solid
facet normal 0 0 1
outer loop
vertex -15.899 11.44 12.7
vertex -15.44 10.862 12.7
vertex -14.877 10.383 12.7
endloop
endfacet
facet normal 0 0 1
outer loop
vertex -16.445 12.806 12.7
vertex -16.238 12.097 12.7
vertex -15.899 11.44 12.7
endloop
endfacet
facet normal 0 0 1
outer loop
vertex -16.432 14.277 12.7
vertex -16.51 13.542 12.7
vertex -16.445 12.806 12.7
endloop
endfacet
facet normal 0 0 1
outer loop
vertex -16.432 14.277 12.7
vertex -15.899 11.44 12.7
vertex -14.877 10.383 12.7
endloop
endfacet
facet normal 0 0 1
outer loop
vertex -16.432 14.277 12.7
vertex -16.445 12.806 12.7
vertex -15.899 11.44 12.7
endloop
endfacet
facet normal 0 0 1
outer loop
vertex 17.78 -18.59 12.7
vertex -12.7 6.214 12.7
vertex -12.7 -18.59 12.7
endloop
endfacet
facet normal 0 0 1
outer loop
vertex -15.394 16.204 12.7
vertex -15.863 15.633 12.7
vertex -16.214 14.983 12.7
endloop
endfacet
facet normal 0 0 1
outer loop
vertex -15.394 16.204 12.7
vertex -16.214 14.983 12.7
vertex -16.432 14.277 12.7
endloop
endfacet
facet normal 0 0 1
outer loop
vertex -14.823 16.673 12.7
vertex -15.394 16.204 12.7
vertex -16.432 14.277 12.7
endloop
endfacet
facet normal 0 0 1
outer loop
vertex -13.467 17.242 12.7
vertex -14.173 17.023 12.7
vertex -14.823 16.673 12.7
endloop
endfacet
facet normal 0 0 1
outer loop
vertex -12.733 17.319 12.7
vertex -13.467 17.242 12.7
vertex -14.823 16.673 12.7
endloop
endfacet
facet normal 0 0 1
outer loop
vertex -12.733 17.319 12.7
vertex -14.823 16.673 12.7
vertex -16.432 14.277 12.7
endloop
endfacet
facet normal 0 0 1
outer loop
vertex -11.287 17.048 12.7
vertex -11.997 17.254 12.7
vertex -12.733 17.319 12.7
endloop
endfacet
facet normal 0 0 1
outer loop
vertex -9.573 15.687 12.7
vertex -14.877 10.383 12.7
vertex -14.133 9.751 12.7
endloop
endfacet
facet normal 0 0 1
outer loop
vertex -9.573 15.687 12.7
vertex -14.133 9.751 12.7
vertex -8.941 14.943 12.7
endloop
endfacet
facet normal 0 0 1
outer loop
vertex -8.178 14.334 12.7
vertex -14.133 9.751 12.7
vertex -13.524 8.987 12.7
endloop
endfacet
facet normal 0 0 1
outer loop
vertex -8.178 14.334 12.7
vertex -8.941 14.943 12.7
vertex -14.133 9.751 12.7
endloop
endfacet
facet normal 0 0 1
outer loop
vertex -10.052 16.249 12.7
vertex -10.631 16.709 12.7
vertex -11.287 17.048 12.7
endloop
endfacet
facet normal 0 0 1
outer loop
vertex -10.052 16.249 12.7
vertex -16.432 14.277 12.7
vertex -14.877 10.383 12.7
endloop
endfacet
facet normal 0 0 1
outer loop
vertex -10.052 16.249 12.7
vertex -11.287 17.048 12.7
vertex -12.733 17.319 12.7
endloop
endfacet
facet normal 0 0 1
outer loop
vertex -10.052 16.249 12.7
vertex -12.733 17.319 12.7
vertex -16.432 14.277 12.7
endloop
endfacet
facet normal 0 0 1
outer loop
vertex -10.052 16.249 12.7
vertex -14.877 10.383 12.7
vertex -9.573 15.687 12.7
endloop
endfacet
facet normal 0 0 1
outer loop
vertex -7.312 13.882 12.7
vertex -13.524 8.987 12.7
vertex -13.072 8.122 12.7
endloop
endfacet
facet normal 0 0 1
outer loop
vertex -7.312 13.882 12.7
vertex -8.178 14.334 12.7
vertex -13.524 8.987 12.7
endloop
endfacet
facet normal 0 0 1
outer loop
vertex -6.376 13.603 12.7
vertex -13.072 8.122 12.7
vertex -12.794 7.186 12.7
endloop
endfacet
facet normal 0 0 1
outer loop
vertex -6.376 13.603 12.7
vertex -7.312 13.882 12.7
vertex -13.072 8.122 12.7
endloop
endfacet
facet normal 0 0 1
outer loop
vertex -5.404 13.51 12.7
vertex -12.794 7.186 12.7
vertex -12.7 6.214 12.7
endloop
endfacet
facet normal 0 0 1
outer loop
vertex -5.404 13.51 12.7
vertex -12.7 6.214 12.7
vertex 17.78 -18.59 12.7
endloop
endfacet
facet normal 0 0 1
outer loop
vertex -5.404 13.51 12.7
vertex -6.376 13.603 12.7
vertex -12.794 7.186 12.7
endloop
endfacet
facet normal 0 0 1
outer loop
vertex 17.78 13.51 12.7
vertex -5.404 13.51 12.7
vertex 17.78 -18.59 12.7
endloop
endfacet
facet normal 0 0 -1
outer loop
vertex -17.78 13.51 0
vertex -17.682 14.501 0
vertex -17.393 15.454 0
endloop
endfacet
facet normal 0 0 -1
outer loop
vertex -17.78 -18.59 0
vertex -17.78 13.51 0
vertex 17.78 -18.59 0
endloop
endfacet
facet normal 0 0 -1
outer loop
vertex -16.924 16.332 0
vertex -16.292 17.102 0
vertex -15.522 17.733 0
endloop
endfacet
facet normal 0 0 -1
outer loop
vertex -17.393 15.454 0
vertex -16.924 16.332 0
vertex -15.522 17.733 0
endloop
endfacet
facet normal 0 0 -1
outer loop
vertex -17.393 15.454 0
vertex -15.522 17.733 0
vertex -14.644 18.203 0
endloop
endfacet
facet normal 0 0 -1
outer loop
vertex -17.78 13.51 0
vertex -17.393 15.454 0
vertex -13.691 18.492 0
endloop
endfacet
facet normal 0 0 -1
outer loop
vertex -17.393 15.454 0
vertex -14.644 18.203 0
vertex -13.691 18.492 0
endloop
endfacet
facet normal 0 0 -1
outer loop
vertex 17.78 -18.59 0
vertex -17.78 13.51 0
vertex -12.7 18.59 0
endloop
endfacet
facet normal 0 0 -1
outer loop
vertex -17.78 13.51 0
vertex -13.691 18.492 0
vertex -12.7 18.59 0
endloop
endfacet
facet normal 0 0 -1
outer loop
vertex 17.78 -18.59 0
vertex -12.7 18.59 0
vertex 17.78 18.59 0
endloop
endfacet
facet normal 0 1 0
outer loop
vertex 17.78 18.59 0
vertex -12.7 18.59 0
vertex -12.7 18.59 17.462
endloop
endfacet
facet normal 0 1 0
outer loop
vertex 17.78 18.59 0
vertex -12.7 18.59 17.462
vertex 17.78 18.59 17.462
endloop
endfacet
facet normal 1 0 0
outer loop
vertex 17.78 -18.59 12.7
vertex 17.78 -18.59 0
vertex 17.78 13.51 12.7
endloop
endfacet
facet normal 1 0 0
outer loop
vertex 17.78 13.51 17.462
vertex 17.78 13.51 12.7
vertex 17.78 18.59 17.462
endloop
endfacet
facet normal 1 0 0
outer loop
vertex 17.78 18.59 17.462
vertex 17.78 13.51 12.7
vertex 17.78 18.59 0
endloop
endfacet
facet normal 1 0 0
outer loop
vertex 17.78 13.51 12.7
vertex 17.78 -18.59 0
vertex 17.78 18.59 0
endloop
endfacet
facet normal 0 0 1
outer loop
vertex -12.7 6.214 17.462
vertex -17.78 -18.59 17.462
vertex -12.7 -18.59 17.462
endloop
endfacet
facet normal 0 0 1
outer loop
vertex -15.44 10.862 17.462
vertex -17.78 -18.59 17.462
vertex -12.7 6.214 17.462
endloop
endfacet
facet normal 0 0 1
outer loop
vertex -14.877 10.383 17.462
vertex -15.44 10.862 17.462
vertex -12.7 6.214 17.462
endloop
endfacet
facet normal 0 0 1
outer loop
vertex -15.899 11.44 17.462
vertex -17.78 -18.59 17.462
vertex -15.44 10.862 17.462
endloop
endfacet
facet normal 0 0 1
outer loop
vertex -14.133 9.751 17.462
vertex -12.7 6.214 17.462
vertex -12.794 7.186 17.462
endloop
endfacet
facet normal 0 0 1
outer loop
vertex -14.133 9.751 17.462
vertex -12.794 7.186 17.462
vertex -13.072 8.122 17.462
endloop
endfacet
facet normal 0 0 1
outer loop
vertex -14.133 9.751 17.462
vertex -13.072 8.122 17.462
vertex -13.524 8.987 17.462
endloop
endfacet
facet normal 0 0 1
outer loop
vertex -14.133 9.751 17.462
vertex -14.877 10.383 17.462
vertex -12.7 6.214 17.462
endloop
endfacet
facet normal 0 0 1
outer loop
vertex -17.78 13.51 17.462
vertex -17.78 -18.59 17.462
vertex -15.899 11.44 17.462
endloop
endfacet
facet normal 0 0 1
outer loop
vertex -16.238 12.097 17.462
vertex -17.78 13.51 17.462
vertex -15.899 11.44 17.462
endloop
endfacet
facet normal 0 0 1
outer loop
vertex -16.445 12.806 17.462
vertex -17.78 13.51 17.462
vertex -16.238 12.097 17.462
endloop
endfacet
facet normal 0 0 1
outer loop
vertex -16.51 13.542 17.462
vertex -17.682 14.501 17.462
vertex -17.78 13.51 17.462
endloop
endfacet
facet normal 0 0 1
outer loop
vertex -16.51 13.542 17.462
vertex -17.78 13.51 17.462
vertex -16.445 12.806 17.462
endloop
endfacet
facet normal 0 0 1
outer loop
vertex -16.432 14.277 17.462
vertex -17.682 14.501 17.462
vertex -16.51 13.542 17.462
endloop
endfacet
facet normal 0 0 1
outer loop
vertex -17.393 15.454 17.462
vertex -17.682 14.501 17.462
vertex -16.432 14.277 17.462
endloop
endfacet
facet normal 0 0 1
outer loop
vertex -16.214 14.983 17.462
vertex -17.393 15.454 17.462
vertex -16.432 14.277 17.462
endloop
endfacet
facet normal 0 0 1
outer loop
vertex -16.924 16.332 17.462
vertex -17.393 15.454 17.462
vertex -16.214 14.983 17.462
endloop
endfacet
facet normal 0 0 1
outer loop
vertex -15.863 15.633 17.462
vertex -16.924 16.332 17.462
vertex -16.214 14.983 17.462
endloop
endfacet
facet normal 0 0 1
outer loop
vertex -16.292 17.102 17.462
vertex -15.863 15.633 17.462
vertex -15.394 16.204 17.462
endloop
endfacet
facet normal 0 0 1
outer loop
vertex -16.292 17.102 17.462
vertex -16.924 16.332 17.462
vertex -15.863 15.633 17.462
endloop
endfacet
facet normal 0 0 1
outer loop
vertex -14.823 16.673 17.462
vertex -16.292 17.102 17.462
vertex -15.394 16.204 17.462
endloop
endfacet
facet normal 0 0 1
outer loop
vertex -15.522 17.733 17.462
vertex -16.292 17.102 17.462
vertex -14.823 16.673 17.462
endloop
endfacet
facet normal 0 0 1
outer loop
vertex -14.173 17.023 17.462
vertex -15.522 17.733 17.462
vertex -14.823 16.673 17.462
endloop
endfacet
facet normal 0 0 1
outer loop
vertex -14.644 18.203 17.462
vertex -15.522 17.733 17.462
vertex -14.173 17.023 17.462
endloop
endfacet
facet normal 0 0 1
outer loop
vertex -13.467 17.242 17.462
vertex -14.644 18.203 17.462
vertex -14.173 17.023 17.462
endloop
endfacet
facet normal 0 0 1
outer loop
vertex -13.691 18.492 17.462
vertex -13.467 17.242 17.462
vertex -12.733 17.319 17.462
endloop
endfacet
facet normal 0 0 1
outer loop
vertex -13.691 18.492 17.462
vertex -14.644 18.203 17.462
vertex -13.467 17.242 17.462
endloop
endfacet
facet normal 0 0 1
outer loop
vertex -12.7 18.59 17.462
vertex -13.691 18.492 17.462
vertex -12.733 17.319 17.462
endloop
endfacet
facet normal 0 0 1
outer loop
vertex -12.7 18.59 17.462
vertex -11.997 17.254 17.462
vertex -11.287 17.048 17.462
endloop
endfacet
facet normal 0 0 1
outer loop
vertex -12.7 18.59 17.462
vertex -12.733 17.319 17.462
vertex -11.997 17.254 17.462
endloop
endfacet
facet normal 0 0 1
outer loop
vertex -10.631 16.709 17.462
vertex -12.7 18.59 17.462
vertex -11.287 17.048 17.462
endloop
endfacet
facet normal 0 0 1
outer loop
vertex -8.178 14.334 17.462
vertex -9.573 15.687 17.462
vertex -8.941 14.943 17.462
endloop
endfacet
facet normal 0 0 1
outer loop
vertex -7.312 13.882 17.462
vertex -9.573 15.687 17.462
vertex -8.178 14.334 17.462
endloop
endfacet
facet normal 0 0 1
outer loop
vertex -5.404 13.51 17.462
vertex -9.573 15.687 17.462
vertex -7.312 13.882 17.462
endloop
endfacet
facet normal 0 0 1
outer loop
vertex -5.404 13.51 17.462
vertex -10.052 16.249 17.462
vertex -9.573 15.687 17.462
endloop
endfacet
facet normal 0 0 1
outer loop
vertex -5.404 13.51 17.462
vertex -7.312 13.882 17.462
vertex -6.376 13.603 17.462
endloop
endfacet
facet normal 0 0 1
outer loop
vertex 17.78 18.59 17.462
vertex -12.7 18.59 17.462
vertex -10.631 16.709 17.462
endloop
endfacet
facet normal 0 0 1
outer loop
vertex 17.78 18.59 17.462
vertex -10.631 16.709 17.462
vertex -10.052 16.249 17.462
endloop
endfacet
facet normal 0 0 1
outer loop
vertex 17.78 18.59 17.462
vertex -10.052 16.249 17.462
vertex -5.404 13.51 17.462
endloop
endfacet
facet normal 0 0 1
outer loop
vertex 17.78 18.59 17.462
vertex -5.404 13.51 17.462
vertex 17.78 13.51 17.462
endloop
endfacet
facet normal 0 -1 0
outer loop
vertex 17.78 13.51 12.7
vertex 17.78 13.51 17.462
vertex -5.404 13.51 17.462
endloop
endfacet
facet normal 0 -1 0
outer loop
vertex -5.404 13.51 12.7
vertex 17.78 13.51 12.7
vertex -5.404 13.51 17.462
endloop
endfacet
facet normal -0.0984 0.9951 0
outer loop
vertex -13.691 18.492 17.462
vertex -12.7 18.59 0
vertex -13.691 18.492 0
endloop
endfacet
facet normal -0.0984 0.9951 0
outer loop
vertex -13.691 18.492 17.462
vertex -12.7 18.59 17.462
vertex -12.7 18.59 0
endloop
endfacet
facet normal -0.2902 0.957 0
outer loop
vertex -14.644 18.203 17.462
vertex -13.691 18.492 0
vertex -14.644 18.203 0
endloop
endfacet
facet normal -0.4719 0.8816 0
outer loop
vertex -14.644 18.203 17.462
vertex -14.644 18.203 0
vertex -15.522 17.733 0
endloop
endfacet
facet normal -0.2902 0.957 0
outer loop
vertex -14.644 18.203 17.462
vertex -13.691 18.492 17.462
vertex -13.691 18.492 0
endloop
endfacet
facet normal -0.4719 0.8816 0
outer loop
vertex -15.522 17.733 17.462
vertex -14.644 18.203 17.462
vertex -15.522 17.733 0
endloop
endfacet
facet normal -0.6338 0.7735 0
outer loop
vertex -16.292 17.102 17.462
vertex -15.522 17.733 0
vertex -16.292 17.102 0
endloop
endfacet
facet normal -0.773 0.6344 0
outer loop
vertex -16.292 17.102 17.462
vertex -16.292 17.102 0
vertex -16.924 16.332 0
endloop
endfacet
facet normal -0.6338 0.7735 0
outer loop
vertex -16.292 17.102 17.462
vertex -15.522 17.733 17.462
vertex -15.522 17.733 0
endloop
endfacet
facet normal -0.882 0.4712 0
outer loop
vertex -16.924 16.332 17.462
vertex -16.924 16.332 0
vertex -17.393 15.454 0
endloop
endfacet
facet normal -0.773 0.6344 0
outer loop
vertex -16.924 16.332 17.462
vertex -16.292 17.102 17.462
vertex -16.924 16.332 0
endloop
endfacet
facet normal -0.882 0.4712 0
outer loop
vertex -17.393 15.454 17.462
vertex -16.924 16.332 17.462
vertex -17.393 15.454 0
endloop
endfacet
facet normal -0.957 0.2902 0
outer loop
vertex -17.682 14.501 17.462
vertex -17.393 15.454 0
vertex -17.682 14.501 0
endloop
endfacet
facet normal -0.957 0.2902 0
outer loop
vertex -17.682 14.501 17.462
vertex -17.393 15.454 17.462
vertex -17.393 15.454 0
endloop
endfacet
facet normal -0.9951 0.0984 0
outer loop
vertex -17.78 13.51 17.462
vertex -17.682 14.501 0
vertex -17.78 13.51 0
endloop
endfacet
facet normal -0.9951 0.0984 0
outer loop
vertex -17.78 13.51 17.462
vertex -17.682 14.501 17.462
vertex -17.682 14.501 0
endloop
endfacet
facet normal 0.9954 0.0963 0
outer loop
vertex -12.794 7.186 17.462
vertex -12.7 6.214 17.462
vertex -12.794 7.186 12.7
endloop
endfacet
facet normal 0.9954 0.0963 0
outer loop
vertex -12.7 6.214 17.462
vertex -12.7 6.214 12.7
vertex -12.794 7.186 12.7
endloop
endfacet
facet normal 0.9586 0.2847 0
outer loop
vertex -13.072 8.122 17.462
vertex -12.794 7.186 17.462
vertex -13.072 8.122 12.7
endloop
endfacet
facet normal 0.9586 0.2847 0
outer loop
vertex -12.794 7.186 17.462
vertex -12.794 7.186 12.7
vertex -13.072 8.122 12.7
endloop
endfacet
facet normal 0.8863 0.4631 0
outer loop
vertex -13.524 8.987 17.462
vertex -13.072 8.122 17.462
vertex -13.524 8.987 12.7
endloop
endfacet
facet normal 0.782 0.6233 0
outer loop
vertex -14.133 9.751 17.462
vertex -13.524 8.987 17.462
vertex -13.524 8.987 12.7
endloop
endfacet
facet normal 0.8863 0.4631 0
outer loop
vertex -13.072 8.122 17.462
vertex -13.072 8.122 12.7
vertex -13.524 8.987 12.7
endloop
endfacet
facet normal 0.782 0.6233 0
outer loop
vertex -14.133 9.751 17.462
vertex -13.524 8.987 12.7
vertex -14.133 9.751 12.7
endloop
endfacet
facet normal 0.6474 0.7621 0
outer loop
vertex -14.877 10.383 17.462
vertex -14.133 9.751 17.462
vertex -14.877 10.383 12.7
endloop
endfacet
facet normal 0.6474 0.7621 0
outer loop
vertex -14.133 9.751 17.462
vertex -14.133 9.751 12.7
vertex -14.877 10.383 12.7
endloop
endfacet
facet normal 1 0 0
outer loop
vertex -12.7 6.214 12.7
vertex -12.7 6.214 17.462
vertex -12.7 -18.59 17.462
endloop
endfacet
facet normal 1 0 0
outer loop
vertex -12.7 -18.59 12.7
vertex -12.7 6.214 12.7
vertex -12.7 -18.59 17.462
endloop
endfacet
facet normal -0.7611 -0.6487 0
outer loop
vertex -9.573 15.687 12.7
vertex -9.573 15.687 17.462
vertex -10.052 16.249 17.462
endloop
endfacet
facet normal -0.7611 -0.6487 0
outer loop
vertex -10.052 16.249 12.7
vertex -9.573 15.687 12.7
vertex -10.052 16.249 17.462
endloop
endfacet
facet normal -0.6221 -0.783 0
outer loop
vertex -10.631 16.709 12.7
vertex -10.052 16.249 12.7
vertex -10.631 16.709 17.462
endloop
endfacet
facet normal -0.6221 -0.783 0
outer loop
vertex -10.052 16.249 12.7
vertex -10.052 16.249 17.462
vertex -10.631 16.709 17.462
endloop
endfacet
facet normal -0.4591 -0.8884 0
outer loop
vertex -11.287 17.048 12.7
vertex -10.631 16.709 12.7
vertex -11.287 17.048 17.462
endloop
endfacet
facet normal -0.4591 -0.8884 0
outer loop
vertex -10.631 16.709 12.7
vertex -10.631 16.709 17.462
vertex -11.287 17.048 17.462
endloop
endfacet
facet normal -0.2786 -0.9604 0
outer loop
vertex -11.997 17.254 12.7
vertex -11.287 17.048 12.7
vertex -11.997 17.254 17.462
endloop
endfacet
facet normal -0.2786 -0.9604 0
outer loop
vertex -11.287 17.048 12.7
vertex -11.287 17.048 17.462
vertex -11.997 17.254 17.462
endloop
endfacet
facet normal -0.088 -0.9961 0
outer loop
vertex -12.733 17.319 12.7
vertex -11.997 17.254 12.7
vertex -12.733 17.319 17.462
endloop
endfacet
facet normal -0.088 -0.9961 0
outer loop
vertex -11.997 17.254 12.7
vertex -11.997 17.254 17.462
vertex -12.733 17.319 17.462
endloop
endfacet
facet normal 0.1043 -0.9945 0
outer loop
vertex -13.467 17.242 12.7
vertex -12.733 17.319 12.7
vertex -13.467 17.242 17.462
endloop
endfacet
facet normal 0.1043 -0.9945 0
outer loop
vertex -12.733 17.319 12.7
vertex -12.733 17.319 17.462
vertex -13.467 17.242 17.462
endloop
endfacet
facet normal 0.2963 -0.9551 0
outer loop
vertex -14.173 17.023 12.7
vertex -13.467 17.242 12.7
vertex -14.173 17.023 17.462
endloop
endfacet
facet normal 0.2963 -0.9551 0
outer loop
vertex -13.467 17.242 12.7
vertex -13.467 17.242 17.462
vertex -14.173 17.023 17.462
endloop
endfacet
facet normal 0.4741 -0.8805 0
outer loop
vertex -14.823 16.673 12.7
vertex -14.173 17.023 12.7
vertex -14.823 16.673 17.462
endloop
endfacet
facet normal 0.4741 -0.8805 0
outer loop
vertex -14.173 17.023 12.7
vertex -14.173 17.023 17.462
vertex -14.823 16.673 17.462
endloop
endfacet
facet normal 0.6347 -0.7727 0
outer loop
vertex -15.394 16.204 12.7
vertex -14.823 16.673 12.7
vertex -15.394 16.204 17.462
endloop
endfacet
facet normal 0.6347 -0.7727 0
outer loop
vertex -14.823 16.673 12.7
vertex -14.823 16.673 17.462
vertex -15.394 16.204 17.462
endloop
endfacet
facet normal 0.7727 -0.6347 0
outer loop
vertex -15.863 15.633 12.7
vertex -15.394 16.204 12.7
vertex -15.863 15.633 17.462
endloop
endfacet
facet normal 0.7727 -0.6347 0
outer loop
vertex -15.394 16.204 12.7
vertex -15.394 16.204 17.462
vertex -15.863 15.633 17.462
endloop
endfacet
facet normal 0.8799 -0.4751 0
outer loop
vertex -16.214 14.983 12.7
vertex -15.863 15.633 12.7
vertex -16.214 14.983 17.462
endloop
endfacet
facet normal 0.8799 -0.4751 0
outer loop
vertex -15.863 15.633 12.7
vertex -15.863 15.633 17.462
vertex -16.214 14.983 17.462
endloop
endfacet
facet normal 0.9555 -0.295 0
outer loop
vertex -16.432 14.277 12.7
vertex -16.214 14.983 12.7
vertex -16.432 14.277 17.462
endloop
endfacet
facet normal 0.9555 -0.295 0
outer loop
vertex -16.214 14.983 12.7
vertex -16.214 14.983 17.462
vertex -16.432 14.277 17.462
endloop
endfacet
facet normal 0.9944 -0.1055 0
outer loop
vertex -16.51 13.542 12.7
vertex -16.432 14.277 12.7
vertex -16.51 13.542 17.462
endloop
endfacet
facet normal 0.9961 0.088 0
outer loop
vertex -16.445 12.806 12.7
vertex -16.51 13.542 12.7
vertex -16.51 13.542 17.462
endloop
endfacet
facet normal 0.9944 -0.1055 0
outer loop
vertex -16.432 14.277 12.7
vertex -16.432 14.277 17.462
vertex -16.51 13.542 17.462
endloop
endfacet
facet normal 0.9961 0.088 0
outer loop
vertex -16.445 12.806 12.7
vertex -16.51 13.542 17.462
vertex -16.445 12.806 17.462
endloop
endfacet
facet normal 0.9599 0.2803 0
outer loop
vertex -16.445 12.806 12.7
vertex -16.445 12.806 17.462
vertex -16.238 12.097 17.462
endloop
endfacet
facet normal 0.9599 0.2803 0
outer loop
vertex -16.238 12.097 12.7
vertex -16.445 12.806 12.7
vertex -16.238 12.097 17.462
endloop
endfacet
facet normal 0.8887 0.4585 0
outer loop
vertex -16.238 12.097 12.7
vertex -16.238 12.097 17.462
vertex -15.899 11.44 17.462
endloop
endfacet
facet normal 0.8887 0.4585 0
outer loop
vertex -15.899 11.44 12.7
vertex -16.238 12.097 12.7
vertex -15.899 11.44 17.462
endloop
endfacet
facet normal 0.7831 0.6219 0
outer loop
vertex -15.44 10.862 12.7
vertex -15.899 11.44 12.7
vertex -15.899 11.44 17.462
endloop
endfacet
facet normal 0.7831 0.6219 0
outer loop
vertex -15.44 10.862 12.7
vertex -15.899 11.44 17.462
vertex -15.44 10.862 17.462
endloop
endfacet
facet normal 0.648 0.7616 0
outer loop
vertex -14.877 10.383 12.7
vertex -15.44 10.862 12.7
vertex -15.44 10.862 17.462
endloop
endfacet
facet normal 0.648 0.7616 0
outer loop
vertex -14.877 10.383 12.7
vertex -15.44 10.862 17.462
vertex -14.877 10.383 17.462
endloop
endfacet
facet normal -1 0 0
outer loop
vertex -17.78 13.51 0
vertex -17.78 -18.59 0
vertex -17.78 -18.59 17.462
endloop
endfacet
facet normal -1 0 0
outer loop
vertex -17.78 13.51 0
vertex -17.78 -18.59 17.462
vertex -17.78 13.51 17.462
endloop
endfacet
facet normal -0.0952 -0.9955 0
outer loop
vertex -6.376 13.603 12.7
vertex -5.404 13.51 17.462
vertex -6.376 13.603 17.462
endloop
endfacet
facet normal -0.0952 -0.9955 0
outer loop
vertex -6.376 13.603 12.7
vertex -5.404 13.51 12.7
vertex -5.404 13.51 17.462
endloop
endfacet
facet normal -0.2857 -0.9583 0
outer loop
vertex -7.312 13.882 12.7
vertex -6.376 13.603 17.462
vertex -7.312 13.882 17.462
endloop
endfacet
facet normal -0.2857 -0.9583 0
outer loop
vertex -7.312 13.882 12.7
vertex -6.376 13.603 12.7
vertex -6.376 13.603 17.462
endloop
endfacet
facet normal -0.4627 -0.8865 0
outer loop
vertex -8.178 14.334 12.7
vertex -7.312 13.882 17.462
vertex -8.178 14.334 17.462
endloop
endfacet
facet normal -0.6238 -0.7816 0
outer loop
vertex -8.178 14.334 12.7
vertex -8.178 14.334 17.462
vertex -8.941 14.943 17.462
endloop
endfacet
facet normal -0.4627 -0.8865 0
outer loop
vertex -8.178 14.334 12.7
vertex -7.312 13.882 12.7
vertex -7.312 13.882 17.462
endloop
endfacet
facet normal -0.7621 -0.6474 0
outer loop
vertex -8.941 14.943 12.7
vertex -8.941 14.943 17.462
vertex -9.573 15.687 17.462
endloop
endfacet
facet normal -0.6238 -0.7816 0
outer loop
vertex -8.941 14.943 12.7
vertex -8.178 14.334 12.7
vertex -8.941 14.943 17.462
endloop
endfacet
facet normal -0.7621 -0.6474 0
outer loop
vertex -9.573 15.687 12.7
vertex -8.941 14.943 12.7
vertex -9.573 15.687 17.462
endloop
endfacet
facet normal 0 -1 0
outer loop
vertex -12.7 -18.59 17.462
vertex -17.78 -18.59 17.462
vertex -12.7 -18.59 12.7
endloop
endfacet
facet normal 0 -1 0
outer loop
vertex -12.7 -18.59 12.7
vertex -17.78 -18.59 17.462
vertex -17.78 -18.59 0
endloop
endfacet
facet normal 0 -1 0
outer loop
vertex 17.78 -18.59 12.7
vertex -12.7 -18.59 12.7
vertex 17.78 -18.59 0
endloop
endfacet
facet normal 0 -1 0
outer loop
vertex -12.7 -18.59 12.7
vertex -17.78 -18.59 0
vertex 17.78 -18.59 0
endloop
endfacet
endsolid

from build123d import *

# Parameters (mm, degrees)
F0_W     = 35.56
F0_H     = 37.1792408654
F1_DEPTH = 17.4625
F3_DEPTH = 4.7625
F4_R     = 5.08
F5_R     = 5.08


# Not quite as in the source:
# - a length typed as a fraction of an inch, garbled in the dataset ("3 / 203.2 mm" for 3/8 in), is restored


with BuildPart() as f1:
    # F0 (on Top) → F1 (new body)
    with BuildSketch(Plane.XY):
        Rectangle(F0_W, F0_H)
    extrude(amount=F1_DEPTH)

    # F2 (on face) → F3 (cut)
    with BuildSketch(Plane.XY.offset(17.4625)):
        with BuildLine():
            Line((-12.7, -18.5896204327), (17.78, -18.5896204327))
            Line((17.78, -18.5896204327), (17.78, 13.5096204327))
            Line((17.78, 13.5096204327), (-8.89, 13.5096204327))
            ThreePointArc((-8.89, 13.5096204327), (-15.3940768363, 16.203697269), (-12.7, 9.6996204327))
            Line((-12.7, 9.6996204327), (-12.7, -18.5896204327))
        make_face()
    extrude(amount=-F3_DEPTH, mode=Mode.SUBTRACT)

    # F4
    f4_edges = [f1.edges().sort_by_distance(p)[0] for p in [
        (-12.7, 9.69962, 15.08125),
        (-8.89, 13.50962, 15.08125),
    ]]
    fillet(f4_edges, radius=F4_R)

    # F5
    f5_edges = [f1.edges().sort_by_distance(p)[0] for p in [
        (-17.78, 18.58962, 8.73125),
    ]]
    fillet(f5_edges, radius=F5_R)


solid = f1.part
